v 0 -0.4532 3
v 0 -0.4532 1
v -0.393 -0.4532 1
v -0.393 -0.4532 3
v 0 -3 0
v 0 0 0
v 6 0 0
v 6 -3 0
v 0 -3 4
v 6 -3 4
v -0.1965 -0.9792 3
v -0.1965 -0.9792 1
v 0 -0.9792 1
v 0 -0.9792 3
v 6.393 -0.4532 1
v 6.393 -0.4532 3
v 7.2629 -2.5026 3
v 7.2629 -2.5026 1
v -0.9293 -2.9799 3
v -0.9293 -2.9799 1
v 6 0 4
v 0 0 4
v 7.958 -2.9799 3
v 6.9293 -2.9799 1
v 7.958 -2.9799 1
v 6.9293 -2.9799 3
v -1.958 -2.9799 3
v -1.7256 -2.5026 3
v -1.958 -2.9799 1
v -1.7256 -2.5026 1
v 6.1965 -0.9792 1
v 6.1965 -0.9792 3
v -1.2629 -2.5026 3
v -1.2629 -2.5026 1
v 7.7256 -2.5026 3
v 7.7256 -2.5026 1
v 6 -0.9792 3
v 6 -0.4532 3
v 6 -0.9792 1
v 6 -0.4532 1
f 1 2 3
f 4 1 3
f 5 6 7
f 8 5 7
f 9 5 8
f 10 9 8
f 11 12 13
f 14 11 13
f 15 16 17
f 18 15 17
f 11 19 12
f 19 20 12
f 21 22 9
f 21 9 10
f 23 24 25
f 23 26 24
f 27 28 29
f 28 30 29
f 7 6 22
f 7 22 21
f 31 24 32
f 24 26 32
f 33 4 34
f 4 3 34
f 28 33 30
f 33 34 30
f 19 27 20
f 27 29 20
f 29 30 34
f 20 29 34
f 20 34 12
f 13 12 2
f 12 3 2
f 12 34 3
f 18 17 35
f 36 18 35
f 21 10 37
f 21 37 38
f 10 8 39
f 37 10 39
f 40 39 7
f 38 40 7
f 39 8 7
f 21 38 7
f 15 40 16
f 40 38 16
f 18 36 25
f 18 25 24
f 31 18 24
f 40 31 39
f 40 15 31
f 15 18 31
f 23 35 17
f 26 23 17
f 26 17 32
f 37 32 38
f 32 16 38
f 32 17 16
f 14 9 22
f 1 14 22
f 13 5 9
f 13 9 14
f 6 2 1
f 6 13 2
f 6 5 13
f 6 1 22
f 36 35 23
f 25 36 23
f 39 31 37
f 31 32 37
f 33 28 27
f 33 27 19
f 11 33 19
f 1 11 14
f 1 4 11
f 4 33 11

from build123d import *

# Parameters (mm, degrees)
SKETCH_1_W      = 6
SKETCH_1_H      = 3
EXTRUDE_1_DEPTH = 4
EXTRUDE_2_DEPTH = 1


with BuildPart() as part:
    # 草图1 → 凸台-拉伸1 (new body)
    with BuildSketch(Plane.XY):
        with Locations((3, -1.5)):
            Rectangle(SKETCH_1_W, SKETCH_1_H)
    extrude(amount=EXTRUDE_1_DEPTH)

    # 草图2 → 凸台-拉伸2 (add, symmetric)
    with BuildSketch(Plane.XY.offset(2)):
        Polygon((0, -0.453225327), (-0.392993769, -0.453225327), (-1.262945453, -2.502630735), (-1.725619725, -2.502630735), (-1.958016745, -2.979922814), (-1.262945453, -2.979922814), (-0.92927242, -2.979922814), (-0.196496885, -0.979190926), (0, -0.979190926), align=None)
        Polygon((7.725619725, -2.502630735), (7.958016745, -2.979922814), (7.262945453, -2.979922814), (6.92927242, -2.979922814), (6.196496885, -0.979190926), (6, -0.979190926), (6, -0.453225327), (6.392993769, -0.453225327), (7.262945453, -2.502630735), align=None)
    extrude(amount=EXTRUDE_2_DEPTH, both=True)


solid = part.part
